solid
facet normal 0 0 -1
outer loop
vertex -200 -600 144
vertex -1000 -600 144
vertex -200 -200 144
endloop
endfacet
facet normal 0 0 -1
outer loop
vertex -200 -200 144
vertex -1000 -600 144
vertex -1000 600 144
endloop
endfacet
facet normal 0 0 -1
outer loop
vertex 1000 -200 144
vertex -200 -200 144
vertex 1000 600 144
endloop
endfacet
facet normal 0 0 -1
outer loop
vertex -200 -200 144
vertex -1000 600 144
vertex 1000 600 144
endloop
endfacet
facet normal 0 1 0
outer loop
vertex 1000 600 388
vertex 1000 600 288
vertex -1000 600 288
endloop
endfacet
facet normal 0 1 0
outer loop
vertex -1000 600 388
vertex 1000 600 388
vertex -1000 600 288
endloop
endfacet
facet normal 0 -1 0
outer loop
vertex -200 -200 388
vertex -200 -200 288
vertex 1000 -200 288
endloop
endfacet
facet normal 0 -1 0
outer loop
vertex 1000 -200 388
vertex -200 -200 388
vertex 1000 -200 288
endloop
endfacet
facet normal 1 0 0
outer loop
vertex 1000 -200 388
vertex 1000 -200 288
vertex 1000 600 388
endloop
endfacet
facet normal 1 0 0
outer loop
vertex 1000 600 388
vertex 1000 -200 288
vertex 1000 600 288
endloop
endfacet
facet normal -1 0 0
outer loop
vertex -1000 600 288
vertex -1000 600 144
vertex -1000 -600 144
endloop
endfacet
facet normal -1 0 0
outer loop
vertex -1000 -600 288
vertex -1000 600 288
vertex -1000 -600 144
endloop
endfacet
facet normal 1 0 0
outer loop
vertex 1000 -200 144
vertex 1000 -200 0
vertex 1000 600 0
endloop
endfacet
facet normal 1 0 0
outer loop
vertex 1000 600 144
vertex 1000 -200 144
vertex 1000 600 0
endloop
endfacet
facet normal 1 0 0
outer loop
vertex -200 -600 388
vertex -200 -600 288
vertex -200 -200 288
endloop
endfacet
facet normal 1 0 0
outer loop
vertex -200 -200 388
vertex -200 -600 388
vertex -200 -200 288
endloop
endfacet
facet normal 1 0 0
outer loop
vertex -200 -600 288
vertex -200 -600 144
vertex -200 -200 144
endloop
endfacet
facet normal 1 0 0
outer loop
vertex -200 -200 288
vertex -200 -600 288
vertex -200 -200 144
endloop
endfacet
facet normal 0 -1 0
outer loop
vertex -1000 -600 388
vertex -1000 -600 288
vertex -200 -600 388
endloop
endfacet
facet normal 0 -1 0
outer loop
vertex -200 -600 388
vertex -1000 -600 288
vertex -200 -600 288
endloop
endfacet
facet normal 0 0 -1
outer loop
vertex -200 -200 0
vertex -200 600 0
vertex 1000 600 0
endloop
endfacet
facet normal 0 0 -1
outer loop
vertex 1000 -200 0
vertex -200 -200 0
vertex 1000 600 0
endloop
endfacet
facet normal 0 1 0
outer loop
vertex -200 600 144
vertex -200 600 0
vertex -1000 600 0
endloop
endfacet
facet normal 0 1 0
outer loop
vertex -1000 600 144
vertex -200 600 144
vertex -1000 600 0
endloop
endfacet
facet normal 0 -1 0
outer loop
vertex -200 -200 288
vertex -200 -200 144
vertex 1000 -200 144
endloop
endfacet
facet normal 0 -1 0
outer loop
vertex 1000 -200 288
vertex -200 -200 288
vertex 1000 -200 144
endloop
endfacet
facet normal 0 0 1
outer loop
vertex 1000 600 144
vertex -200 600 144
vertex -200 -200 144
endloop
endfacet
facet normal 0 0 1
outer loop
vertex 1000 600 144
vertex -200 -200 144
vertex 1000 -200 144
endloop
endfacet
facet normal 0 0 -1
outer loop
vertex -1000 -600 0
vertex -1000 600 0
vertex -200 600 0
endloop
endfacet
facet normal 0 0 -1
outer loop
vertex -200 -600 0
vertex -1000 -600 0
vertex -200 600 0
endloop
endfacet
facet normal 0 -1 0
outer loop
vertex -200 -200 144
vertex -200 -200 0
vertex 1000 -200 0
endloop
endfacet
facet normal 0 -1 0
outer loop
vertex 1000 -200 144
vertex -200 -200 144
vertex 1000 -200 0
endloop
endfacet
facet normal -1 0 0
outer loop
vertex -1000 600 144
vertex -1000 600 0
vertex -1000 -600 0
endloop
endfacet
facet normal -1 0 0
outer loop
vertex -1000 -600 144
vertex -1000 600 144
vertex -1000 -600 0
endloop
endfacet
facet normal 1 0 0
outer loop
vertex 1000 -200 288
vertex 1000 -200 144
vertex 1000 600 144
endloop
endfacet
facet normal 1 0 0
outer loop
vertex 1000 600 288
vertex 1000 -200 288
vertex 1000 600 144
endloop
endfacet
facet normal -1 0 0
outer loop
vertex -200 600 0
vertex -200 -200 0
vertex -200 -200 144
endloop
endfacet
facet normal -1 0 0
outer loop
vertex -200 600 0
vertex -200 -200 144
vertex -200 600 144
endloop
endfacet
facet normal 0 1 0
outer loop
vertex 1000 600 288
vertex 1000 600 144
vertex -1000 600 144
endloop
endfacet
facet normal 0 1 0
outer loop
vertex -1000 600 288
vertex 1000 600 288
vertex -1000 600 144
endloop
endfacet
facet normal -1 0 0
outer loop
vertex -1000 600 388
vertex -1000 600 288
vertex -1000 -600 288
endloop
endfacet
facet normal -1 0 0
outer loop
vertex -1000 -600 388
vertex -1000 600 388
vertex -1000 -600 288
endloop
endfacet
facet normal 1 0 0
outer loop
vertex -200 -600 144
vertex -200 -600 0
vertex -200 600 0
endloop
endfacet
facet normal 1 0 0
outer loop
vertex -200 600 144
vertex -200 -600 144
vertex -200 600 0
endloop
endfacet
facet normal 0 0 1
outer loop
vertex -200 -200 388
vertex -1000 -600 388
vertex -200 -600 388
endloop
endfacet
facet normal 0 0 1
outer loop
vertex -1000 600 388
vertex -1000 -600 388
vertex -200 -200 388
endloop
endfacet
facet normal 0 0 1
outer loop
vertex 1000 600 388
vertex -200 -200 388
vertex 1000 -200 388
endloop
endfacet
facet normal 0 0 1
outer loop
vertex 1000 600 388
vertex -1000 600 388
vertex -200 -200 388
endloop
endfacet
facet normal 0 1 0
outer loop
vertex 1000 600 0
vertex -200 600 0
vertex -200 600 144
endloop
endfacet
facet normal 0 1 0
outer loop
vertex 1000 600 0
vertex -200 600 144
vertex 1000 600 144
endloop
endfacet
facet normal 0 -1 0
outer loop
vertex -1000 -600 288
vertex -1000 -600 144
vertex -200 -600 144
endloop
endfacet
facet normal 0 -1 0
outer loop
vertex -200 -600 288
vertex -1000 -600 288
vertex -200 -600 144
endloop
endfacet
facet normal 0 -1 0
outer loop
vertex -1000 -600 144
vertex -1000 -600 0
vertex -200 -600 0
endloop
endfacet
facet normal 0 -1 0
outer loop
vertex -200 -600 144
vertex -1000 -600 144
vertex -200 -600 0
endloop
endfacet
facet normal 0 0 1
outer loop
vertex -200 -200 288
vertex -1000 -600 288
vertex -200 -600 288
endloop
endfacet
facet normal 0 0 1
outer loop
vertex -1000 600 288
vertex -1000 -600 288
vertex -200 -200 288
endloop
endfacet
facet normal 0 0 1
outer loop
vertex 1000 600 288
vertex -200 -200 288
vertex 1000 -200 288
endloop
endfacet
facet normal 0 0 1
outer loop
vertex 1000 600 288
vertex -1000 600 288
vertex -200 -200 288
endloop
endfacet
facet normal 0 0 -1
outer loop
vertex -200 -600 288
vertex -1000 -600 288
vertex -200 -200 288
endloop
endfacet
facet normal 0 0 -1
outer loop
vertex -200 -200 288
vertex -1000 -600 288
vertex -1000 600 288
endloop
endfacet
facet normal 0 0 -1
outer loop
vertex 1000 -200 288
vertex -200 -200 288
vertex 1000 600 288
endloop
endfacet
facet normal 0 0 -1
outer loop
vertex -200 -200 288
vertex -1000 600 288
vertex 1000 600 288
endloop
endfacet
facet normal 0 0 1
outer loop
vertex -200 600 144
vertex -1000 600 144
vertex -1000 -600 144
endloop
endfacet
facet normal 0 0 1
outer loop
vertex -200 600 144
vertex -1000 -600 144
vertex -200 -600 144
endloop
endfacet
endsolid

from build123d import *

# Parameters (mm, degrees)
F1_DEPTH = 144
F0_W     = 1200
F0_H     = 800
F2_DEPTH = 144
F3_W     = 1200
F3_H     = 800
F4_DEPTH = 144
F6_DEPTH = 100


with BuildPart() as f1:
    # F0 (on Top) → F1 (new body)
    with BuildSketch(Plane.XY):
        Polygon((-200, -200), (-200, 600), (-1000, 600), (-1000, -600), (-200, -600), align=None)
    extrude(amount=F1_DEPTH)


with BuildPart() as f2:
    # F0 (on Top) → F2 (new body)
    with BuildSketch(Plane.XY):
        with Locations((400, 200)):
            Rectangle(F0_W, F0_H)
    extrude(amount=F2_DEPTH)


with BuildPart() as f4:
    # F3 (on face) → F4 (new body)
    with BuildSketch(Plane.XY.offset(144)):
        Polygon((-200, 600), (-1000, 600), (-1000, -600), (-200, -600), (-200, -200), align=None)
        with Locations((400, 200)):
            Rectangle(F3_W, F3_H)
    extrude(amount=F4_DEPTH)


with BuildPart() as f6:
    # F5 (on face) → F6 (new body)
    with BuildSketch(Plane.XY.offset(288)):
        Polygon((-1000, -600), (-200, -600), (-200, -200), (1000, -200), (1000, 600), (-1000, 600), align=None)
    extrude(amount=F6_DEPTH)


solid = Compound([f1.part, f2.part, f4.part, f6.part])
